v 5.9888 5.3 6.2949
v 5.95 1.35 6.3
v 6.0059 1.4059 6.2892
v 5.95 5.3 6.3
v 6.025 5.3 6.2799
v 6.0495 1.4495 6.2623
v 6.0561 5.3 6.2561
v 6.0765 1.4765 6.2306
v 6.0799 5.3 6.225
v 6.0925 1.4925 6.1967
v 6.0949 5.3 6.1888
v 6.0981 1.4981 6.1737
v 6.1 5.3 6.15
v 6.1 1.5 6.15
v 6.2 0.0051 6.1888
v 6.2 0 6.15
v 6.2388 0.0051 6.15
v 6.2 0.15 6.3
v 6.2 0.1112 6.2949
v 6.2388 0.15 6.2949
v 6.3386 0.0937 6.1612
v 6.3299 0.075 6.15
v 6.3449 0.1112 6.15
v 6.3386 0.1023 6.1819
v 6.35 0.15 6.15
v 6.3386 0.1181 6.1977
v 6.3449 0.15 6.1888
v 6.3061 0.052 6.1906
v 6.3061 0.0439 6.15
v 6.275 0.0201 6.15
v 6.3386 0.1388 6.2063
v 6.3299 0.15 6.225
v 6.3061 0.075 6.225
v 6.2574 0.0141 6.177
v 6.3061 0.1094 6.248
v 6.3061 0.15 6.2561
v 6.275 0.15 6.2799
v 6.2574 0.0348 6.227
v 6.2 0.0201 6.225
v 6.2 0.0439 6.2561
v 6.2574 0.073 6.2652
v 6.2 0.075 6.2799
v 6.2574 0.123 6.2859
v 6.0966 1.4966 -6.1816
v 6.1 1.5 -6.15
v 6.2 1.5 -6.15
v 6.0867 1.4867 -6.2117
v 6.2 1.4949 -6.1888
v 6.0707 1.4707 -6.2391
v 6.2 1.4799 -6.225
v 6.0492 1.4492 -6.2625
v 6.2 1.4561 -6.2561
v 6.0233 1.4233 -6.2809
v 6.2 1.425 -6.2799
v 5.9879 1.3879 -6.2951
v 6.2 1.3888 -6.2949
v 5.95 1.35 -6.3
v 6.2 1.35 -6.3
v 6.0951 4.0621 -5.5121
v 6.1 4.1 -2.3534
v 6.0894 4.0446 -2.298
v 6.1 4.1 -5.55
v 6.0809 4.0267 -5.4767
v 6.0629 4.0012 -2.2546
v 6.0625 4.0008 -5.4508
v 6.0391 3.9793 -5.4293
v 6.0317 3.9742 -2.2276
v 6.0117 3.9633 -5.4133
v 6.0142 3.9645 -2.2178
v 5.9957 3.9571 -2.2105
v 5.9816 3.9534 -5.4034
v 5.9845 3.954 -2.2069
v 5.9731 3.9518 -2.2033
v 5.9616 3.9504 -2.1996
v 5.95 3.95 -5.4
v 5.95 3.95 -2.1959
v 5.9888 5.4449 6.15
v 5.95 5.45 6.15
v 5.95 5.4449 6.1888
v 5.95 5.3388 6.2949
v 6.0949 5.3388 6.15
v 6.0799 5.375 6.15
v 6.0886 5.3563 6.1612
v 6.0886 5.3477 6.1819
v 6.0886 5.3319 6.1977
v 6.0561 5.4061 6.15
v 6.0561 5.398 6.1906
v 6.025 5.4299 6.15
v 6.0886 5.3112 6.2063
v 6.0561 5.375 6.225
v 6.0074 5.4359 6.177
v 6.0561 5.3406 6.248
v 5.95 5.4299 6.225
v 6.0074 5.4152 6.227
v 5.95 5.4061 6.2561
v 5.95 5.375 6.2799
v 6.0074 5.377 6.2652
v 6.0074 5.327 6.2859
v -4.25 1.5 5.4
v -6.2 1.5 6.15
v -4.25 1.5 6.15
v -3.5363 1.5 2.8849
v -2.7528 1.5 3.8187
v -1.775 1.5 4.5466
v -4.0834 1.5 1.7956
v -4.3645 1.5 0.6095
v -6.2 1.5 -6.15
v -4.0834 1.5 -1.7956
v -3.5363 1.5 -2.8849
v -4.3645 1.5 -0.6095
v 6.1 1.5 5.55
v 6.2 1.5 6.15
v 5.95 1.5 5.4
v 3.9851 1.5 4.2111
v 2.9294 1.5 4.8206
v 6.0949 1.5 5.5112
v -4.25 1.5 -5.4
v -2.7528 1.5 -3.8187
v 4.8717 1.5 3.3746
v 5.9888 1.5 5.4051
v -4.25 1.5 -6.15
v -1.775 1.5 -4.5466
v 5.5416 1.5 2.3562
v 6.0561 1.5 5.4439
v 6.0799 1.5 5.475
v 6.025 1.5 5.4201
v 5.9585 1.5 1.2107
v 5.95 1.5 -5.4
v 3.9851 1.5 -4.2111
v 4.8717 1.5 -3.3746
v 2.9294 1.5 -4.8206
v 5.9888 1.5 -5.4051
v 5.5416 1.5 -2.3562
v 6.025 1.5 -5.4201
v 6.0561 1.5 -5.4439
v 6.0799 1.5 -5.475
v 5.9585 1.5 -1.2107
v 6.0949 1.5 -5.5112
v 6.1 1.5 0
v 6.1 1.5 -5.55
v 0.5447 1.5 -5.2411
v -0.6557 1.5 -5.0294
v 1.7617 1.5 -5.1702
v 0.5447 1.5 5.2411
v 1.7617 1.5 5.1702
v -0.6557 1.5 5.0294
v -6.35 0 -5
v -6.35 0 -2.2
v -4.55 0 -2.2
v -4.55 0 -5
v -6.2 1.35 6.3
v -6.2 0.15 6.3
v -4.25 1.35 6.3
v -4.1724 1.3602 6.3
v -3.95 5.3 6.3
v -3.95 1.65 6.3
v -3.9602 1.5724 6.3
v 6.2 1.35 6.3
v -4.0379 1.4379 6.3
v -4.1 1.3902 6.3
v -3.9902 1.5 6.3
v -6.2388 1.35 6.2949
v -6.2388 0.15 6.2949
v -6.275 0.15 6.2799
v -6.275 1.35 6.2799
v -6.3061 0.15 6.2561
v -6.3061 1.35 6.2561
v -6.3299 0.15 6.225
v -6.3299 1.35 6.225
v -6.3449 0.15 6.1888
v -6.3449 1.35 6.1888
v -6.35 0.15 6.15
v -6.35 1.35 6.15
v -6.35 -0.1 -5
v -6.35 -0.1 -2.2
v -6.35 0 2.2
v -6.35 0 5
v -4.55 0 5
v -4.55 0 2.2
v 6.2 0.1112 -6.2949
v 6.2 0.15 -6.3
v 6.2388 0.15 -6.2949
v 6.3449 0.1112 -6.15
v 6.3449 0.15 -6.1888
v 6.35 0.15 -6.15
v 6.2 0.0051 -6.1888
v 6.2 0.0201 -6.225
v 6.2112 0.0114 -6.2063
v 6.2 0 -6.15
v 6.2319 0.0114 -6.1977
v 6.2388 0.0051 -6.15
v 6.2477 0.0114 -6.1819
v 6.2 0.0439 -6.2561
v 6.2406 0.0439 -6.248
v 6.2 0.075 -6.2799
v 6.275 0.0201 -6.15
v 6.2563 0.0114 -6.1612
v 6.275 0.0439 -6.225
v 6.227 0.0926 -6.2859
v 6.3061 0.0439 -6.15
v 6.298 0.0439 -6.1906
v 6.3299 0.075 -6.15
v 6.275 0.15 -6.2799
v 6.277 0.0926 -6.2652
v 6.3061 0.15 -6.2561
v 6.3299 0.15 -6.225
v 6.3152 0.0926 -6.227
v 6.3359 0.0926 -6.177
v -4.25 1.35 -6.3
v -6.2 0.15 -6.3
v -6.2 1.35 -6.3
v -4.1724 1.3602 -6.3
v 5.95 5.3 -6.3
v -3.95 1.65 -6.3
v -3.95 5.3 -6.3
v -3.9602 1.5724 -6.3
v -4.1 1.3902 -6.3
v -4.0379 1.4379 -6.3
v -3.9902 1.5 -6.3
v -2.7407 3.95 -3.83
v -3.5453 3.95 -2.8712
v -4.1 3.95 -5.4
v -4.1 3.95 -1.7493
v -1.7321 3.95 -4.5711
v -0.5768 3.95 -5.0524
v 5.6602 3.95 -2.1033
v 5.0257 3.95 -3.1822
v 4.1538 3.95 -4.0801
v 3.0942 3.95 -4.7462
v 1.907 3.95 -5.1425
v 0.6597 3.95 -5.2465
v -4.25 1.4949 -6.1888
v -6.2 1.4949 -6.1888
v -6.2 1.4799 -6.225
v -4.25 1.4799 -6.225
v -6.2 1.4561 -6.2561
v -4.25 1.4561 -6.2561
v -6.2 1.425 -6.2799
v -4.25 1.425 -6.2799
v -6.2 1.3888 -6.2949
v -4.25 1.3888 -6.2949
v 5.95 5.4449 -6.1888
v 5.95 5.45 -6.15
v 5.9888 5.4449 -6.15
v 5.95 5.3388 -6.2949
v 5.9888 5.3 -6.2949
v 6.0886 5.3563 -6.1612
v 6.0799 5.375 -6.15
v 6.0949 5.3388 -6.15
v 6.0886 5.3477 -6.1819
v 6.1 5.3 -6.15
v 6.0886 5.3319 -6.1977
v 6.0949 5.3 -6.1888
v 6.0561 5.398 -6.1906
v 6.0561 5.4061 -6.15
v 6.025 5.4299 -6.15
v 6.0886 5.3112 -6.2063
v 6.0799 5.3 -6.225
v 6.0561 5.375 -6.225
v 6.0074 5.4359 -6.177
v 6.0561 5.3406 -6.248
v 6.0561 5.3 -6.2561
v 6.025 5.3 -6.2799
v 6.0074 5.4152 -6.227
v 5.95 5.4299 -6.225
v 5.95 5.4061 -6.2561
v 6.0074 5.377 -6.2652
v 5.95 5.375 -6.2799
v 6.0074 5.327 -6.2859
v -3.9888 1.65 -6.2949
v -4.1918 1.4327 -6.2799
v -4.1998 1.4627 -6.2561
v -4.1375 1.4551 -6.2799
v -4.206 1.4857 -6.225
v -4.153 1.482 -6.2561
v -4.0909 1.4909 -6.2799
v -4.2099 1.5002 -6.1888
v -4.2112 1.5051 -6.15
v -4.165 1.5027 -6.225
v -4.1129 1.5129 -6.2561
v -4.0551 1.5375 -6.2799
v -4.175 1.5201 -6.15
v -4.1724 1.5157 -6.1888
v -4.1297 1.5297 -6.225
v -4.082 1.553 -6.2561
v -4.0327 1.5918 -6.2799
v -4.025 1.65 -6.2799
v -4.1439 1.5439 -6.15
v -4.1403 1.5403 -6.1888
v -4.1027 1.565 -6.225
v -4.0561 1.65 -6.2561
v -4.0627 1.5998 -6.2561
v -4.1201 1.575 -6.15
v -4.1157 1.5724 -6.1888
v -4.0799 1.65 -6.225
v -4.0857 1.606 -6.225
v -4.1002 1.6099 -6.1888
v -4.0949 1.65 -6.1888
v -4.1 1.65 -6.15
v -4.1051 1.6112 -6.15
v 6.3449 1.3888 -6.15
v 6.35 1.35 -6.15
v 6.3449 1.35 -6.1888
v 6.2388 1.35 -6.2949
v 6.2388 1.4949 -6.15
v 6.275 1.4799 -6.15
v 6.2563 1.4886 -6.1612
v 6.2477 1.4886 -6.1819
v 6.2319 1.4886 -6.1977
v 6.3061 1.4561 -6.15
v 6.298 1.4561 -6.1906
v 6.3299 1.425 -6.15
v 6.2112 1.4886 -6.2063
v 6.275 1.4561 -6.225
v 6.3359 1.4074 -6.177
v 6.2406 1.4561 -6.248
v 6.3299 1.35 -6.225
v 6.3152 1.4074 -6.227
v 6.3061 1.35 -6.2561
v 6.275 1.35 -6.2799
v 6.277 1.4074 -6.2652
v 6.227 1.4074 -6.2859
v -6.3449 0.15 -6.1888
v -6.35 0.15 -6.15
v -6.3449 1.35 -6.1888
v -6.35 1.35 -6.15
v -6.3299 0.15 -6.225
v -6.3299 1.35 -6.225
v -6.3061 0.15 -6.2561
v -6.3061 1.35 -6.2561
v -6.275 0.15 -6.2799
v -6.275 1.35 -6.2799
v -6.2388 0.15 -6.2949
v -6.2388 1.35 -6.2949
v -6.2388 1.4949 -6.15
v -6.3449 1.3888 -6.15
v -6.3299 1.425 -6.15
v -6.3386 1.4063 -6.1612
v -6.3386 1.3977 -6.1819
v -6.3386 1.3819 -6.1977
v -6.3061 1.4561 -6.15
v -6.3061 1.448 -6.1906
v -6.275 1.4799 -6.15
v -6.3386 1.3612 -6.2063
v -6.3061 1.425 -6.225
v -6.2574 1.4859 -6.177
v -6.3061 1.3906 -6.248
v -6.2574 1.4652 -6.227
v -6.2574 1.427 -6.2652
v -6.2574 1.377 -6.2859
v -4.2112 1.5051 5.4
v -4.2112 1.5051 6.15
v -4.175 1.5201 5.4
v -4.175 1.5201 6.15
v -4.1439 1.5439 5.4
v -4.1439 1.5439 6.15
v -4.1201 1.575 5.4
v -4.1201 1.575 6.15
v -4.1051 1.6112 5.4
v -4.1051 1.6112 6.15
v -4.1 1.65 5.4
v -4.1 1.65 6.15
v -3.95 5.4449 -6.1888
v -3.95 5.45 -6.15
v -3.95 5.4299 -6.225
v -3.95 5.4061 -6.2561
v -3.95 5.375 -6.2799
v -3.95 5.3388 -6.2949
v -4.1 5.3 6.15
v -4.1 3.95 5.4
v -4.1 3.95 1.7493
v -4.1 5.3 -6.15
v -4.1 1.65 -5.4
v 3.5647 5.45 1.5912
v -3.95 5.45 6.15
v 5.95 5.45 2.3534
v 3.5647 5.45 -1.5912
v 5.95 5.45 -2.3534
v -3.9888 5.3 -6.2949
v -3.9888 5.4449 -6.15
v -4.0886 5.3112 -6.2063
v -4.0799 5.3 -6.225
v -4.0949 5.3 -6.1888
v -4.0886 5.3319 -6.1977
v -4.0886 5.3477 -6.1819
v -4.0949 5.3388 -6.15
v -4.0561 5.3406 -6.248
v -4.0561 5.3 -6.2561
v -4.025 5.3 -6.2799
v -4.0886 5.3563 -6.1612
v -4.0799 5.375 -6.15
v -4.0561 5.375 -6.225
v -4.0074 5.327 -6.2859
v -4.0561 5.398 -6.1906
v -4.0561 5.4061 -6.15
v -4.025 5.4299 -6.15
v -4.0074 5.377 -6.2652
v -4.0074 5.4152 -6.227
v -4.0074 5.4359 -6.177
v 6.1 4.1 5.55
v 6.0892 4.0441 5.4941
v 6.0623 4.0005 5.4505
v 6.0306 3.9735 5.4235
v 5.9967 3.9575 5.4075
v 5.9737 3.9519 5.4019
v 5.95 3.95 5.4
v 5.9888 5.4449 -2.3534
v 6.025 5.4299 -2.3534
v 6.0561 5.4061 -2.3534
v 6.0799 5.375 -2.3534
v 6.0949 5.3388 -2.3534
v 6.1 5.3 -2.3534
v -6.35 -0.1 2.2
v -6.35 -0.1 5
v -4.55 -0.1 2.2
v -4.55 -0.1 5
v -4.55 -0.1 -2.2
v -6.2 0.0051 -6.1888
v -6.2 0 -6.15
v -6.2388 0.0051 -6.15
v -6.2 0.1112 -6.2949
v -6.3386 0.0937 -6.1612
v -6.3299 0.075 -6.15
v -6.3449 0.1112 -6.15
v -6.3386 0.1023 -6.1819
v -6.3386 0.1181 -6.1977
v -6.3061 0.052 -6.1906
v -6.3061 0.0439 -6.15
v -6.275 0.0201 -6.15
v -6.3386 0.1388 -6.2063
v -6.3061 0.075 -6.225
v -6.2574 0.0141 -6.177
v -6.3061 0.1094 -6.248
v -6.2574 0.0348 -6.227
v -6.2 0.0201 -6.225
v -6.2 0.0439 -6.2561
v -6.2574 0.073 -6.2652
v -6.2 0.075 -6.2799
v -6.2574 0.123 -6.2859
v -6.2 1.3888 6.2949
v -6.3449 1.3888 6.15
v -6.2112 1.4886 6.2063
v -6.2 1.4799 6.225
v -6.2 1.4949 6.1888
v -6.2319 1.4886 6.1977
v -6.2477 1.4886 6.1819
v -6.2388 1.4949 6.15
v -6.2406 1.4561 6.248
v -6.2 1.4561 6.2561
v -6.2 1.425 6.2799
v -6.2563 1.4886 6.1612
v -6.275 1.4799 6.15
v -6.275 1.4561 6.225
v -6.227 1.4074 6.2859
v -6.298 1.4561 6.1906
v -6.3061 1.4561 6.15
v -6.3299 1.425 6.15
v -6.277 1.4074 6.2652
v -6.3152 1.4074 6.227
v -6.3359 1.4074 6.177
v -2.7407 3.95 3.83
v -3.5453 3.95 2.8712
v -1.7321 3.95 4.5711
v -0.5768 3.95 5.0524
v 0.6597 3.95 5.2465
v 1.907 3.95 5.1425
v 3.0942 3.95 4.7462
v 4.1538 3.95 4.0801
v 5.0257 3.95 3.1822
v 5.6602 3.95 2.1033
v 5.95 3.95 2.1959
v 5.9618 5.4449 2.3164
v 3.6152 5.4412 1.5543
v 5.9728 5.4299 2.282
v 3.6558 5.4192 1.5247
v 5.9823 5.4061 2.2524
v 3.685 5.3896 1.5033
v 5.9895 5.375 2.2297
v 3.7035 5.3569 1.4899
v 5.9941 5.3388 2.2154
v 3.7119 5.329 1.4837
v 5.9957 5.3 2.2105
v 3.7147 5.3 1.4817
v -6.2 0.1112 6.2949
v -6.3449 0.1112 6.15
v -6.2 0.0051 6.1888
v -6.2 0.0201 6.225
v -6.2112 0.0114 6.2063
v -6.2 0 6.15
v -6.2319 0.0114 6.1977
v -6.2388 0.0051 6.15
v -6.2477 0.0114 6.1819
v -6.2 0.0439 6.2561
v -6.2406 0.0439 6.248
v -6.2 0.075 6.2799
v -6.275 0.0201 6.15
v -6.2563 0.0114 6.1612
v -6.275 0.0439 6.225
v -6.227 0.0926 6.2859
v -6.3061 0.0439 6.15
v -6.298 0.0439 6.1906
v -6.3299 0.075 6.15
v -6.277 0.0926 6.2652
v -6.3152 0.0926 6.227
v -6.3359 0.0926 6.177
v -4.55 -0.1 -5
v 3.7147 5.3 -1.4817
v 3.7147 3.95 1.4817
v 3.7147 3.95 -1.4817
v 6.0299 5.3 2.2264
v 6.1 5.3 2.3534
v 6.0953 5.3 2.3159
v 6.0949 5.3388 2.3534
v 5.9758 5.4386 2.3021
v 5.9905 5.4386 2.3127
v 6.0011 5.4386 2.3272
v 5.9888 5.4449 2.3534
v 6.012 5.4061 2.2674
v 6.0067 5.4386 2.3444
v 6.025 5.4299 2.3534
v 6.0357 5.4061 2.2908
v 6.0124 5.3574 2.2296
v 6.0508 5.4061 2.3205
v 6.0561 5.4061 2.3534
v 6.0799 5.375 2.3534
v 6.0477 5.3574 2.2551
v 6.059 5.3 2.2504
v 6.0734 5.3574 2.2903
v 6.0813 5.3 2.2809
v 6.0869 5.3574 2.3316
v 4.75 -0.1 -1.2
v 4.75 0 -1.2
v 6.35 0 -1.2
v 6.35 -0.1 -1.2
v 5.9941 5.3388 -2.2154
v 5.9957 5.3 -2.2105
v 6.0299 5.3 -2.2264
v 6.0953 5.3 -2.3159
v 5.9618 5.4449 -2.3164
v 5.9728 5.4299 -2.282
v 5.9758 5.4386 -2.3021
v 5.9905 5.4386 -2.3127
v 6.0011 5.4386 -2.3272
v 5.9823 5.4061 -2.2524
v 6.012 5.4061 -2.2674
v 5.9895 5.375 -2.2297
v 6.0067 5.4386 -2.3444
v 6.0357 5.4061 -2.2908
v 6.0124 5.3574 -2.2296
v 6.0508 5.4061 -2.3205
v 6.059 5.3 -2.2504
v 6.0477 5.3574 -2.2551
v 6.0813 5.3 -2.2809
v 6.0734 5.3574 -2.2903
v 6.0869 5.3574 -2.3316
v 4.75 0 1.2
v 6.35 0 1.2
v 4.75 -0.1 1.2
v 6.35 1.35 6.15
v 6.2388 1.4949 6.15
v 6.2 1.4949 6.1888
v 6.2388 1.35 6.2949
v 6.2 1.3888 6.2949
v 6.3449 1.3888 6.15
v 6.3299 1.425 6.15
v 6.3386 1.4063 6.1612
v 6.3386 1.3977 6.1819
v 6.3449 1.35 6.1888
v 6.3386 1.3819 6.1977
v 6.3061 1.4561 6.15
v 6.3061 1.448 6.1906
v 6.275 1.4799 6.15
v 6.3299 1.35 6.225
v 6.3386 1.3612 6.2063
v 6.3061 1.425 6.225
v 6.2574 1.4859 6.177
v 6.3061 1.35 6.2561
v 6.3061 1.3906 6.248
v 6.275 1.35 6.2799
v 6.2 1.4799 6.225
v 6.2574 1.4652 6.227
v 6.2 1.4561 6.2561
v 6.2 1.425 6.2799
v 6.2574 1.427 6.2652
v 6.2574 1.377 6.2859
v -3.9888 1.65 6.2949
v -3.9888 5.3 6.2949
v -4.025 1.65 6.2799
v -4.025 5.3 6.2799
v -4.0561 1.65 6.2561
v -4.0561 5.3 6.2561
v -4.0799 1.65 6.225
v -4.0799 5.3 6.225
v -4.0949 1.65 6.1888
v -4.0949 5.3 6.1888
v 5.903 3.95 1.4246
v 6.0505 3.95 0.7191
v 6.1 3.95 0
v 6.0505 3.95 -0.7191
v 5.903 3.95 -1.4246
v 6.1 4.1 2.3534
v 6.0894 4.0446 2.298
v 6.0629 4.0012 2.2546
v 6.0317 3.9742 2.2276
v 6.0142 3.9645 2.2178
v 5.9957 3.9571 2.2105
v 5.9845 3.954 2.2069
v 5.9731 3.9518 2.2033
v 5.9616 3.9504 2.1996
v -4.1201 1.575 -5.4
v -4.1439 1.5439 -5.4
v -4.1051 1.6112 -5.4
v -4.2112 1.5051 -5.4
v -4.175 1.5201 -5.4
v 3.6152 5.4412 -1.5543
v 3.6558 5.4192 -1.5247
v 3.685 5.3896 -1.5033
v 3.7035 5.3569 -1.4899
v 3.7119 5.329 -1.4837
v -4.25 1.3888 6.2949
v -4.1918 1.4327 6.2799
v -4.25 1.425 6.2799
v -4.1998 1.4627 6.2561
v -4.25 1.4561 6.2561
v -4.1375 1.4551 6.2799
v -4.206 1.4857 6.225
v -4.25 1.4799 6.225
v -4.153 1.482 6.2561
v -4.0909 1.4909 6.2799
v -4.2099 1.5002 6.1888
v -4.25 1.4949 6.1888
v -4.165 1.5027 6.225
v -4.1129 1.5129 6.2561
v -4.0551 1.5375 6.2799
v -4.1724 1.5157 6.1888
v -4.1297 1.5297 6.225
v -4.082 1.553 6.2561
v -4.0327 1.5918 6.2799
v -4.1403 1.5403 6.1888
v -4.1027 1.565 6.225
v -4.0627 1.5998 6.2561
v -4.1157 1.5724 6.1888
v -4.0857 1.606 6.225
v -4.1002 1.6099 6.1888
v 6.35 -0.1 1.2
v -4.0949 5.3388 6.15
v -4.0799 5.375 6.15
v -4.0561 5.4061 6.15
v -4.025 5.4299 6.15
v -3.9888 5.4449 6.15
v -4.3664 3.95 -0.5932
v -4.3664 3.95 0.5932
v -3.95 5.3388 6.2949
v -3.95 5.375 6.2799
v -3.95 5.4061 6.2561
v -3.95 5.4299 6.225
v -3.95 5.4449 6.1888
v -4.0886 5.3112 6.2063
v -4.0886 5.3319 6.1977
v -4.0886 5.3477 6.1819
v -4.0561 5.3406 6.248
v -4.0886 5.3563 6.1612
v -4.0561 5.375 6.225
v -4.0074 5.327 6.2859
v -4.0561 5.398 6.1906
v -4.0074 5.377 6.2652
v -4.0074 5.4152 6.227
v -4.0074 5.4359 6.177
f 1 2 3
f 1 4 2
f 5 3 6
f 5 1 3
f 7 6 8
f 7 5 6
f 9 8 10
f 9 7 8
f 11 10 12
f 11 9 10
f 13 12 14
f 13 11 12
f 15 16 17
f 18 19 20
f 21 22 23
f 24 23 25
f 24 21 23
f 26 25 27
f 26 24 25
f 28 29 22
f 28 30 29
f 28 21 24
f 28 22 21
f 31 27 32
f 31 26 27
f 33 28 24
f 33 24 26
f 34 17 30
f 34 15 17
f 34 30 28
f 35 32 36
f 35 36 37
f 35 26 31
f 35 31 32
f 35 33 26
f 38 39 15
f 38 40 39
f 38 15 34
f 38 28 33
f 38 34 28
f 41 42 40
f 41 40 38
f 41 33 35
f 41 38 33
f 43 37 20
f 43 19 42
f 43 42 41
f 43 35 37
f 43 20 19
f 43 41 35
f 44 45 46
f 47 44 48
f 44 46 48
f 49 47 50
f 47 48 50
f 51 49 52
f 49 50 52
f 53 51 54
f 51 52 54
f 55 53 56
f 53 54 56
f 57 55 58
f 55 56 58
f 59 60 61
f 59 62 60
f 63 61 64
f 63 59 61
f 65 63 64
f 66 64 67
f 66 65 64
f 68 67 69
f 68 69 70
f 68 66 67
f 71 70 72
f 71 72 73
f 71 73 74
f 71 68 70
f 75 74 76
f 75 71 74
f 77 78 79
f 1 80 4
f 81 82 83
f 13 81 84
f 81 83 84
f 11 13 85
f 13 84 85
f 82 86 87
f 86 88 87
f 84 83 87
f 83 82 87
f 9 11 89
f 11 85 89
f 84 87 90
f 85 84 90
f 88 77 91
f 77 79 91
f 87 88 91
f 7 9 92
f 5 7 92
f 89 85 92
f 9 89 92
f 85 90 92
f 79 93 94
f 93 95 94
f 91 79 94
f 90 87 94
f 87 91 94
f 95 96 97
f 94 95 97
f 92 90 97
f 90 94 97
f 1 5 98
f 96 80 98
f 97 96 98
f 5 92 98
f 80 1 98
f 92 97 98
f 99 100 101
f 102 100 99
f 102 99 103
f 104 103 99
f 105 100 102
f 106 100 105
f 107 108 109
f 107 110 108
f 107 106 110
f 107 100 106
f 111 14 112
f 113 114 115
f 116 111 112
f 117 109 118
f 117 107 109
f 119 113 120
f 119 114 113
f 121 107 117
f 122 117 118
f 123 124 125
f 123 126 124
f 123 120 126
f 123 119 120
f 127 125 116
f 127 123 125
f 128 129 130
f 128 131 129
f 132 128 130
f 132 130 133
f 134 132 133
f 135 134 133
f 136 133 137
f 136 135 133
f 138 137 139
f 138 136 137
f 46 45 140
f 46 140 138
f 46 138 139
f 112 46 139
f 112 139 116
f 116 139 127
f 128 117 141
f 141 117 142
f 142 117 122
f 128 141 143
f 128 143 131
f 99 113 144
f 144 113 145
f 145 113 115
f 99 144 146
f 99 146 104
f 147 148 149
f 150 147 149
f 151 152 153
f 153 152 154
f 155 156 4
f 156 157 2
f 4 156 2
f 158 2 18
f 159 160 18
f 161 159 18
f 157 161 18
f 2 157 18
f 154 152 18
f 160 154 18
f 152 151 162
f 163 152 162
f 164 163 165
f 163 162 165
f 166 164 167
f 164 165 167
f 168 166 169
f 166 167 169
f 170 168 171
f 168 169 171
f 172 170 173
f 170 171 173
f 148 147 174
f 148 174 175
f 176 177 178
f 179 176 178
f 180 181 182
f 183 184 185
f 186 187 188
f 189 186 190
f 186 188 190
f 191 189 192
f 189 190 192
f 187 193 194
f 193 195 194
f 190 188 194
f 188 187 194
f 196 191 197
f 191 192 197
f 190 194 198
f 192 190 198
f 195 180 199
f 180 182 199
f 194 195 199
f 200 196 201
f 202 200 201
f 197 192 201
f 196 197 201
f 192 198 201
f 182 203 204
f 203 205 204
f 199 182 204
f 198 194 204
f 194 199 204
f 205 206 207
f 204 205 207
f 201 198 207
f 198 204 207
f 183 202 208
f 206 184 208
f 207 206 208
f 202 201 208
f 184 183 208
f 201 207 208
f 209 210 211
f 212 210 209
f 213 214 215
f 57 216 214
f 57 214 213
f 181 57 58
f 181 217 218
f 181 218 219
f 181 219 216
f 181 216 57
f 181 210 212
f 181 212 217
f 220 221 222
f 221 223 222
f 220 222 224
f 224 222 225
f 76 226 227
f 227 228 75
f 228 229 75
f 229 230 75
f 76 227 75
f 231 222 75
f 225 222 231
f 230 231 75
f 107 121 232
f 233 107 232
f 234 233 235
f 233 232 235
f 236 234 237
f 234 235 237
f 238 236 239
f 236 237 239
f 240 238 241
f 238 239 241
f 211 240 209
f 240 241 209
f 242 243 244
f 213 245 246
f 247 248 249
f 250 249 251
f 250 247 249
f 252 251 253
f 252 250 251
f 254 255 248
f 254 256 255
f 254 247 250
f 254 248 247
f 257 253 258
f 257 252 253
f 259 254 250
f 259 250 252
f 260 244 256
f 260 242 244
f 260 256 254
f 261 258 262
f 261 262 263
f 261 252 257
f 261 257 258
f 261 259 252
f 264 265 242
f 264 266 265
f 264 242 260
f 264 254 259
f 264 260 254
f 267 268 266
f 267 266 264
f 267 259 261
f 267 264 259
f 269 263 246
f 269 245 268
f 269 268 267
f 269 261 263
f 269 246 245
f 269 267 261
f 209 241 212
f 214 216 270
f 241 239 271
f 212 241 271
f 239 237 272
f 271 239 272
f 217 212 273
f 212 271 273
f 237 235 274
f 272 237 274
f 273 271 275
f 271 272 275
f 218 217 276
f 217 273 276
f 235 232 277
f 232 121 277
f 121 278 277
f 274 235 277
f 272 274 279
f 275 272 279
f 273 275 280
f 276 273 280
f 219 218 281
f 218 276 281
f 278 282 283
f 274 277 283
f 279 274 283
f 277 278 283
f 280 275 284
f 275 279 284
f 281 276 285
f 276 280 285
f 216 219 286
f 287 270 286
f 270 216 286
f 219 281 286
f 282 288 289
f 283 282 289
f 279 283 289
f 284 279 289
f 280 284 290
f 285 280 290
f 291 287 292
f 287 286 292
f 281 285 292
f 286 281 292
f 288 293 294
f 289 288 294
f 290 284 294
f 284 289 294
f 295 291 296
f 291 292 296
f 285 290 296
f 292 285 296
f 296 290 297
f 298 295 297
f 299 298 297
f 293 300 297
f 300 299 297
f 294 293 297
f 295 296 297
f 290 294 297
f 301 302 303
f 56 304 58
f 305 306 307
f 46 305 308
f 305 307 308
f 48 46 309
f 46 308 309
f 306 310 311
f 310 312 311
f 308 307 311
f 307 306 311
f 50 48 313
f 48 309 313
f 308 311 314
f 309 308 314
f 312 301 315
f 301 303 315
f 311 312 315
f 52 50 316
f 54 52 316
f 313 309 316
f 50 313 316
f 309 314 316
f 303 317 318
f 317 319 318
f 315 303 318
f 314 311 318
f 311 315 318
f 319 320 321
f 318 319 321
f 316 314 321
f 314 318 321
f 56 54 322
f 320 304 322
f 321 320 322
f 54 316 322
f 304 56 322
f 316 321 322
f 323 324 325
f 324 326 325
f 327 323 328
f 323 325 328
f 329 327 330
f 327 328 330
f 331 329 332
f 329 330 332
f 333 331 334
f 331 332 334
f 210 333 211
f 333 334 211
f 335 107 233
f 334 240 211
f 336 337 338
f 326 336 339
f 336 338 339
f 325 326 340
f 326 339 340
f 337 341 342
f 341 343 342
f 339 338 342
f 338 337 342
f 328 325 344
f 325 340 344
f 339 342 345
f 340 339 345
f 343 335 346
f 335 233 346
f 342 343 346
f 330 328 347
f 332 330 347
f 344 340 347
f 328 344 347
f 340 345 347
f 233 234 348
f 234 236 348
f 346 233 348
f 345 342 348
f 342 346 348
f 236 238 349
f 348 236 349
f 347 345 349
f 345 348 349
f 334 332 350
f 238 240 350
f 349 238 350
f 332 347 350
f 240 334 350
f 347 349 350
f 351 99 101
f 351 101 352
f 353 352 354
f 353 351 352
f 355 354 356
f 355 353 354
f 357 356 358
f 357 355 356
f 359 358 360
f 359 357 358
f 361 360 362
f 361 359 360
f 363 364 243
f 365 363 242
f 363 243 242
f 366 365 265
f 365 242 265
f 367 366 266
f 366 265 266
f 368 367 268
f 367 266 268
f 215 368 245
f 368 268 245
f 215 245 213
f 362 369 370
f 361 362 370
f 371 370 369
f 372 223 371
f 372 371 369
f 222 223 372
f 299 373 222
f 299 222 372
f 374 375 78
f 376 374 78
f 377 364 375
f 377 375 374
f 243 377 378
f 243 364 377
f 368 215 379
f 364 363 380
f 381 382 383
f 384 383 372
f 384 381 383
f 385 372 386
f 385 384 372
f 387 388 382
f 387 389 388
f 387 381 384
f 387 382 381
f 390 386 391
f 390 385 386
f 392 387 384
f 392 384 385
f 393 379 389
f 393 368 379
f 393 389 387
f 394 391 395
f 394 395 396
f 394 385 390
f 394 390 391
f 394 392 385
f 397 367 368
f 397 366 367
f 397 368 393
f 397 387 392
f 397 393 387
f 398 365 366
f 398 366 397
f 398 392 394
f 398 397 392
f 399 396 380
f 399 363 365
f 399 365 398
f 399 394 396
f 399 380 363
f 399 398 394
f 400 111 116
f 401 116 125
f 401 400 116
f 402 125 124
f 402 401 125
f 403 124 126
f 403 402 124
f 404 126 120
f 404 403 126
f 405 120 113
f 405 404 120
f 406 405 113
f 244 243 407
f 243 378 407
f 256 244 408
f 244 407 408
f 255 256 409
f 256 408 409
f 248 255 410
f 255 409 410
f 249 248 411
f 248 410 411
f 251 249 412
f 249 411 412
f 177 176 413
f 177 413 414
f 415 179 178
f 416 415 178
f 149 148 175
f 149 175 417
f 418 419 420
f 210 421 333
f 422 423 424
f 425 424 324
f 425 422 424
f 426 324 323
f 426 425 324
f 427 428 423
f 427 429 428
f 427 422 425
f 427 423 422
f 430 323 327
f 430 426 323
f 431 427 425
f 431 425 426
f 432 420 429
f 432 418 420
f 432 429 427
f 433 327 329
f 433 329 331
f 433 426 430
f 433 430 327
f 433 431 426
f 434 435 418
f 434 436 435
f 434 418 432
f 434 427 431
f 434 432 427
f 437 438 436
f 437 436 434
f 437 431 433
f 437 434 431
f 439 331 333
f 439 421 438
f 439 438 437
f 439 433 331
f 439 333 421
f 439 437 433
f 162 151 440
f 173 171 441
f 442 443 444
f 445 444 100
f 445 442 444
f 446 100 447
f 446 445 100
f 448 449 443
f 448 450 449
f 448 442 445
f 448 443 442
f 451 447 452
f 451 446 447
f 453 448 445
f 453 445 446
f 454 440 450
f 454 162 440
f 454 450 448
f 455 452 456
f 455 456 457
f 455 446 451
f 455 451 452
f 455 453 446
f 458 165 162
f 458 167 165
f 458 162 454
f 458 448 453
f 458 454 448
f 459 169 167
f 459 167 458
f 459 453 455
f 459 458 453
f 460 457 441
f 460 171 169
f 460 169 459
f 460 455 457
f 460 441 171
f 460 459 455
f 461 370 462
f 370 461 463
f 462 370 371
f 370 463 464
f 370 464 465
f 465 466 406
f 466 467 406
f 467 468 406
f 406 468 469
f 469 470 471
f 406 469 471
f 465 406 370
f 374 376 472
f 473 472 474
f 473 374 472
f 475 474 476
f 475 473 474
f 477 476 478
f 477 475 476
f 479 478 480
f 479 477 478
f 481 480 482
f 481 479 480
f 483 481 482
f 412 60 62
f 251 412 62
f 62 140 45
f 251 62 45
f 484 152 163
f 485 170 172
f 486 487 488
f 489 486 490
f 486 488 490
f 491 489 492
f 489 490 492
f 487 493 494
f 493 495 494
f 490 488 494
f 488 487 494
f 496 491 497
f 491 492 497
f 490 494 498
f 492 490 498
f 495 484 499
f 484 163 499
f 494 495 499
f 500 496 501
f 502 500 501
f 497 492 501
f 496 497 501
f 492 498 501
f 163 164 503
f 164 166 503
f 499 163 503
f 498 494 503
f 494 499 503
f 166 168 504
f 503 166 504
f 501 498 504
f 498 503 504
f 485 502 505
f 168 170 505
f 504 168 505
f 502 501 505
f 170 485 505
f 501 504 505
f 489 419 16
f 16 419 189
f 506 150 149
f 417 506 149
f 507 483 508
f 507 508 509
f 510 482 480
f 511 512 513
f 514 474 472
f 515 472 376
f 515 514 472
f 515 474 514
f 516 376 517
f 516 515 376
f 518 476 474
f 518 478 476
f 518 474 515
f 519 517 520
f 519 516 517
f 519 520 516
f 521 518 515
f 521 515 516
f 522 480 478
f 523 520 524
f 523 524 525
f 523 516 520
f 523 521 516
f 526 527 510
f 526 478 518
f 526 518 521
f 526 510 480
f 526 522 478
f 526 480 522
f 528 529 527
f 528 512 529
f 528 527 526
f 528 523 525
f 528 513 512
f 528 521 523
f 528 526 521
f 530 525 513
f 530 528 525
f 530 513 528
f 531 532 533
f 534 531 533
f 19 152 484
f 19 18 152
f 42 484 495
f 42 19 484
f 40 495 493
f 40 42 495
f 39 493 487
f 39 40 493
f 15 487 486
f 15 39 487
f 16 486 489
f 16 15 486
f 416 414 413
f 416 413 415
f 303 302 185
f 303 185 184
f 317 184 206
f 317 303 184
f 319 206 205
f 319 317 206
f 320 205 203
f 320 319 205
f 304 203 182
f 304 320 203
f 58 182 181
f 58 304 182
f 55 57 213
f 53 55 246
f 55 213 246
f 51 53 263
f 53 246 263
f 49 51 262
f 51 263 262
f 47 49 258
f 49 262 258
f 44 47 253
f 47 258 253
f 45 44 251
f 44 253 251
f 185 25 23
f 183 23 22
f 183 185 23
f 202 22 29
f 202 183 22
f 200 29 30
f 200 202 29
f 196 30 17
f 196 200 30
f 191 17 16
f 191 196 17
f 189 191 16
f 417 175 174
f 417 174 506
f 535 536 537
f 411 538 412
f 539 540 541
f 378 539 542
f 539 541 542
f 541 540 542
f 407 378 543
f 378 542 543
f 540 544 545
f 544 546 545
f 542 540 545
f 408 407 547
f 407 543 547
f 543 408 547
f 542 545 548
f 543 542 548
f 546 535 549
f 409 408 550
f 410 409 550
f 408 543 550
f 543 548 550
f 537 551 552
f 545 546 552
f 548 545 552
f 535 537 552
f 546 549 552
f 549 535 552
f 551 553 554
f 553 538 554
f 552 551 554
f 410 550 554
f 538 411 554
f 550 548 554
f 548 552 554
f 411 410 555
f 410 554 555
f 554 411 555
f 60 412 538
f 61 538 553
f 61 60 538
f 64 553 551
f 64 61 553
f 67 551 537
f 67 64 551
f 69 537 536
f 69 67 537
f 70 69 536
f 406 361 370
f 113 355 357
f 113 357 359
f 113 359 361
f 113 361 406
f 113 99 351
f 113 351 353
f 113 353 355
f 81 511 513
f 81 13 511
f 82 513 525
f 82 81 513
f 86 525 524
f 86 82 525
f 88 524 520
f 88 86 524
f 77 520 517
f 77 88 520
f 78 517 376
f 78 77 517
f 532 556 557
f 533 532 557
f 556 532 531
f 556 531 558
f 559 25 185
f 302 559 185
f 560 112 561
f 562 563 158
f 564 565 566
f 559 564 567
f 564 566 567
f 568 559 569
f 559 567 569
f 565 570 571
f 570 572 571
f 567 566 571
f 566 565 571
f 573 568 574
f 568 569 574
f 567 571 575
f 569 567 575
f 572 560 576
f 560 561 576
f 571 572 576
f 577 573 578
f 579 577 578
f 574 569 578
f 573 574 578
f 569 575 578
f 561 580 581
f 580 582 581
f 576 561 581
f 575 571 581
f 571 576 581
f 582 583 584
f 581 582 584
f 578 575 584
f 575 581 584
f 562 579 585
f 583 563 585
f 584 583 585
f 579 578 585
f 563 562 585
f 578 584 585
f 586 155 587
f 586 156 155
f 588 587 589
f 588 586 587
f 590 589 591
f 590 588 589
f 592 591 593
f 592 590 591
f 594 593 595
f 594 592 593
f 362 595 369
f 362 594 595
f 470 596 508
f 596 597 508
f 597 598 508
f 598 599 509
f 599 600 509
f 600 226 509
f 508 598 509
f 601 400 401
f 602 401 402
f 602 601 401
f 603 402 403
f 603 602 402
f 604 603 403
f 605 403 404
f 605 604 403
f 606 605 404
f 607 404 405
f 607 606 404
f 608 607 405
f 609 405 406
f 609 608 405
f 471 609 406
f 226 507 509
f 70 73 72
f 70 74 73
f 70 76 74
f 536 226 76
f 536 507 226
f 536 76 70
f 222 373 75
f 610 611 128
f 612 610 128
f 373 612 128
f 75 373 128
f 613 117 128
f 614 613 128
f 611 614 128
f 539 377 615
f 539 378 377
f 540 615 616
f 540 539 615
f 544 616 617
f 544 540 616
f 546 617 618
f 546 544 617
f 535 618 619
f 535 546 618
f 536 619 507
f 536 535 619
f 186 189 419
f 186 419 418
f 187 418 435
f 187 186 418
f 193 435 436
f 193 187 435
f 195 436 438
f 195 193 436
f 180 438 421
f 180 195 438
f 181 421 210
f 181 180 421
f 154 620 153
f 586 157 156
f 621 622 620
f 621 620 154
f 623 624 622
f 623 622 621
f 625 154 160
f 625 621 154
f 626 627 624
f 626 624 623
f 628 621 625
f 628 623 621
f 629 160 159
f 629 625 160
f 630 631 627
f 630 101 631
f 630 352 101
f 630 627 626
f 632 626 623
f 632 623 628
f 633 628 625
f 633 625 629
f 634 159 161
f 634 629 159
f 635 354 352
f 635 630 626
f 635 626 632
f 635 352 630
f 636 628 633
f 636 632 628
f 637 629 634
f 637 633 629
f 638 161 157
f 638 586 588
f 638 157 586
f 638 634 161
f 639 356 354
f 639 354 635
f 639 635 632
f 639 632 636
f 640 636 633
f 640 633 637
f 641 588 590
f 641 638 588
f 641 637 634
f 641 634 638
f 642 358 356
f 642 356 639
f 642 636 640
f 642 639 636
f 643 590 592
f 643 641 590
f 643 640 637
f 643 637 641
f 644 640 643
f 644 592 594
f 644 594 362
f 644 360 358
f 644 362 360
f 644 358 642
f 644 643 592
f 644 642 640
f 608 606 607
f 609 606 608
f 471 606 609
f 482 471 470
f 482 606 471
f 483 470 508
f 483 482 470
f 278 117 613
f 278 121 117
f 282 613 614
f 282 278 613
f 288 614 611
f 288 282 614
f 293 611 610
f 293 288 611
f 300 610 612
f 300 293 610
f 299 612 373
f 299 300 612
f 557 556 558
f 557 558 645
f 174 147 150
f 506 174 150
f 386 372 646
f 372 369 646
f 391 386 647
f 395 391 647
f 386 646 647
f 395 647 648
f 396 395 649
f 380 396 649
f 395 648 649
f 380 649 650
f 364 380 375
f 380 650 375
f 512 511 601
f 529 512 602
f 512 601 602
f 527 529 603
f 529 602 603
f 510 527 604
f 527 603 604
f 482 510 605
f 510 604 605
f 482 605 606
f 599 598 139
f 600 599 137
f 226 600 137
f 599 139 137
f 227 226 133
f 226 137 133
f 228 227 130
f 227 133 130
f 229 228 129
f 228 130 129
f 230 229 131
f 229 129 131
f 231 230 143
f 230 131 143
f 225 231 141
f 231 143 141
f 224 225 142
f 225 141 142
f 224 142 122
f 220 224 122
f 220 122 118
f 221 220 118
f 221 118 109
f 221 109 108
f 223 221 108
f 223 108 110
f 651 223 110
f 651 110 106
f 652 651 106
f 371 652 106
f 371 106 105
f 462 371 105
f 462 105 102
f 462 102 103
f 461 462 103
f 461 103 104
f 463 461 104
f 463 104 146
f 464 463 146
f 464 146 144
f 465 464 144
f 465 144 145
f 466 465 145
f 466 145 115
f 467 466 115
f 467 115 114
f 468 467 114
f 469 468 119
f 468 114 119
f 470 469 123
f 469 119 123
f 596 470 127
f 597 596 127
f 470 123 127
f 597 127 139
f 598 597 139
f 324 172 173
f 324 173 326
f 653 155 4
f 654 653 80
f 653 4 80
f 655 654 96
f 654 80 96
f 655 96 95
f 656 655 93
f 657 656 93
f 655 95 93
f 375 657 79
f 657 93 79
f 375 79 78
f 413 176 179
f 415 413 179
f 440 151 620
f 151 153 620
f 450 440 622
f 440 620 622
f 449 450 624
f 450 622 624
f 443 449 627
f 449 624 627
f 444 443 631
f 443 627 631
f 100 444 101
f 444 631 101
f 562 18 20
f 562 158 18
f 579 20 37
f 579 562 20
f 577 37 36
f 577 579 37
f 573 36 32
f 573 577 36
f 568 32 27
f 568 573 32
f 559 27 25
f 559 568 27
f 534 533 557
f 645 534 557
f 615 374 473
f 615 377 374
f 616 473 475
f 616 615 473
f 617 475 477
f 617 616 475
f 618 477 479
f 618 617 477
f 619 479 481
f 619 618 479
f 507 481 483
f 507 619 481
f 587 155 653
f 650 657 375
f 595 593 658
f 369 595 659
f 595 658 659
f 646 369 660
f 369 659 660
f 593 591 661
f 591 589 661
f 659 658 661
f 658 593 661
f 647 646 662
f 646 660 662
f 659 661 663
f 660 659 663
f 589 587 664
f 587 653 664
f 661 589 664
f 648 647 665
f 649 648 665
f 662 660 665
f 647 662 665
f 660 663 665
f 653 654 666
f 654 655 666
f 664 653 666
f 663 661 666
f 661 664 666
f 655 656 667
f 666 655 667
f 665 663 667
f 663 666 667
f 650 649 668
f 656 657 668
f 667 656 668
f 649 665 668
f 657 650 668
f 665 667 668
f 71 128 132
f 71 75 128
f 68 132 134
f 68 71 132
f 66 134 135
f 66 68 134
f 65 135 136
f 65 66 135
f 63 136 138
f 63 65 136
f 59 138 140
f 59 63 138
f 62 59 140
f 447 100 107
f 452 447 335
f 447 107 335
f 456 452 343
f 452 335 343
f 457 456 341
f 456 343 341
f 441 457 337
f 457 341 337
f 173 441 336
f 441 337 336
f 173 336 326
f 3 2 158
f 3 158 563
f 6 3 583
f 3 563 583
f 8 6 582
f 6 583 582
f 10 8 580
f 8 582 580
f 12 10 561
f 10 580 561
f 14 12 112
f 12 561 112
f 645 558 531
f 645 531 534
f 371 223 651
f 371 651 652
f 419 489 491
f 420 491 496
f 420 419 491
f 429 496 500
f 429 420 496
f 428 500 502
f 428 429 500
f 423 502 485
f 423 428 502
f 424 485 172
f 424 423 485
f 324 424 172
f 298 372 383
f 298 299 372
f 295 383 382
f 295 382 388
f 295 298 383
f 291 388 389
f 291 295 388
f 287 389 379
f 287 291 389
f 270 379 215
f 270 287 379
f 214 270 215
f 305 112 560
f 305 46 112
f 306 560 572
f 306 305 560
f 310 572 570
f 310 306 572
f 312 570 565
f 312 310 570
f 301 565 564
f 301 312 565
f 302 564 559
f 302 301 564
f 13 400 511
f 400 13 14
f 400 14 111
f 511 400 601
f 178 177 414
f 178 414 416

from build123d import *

# Parameters (mm, degrees)
SKETCH1_W             = 12.7
SKETCH1_H             = 12.6
BOSS_EXTRUDE1_DEPTH   = 1.5
SKETCH2_R             = 5.25
BOSS_EXTRUDE2_DEPTH   = 2.45
SKETCH3_W             = 10.2
SKETCH3_H             = 0.9
BOSS_EXTRUDE3_DEPTH   = 3.95
SKETCH4_W             = 10.2
SKETCH4_H             = 12.6
BOSS_EXTRUDE4_DEPTH   = 1.5
CUT_EXTRUDE1_DEPTH    = 1.5
SKETCH6_W             = 1.8
SKETCH6_H             = 2.8
BOSS_EXTRUDE5_DEPTH   = 0.1
BOSS_EXTRUDE5_2_DEPTH = 0.1
SKETCH6_W_2           = 1.6
SKETCH6_H_2           = 2.4
BOSS_EXTRUDE5_3_DEPTH = 0.1
FILLET1_R             = 0.15


with BuildPart() as part:
    # Sketch1 → Boss-Extrude1 (new body)
    with BuildSketch(Plane(origin=(0, 0, 0), x_dir=(1, 0, 0), z_dir=(0, 1, 0))):
        Rectangle(SKETCH1_W, SKETCH1_H)
    extrude(amount=BOSS_EXTRUDE1_DEPTH)

    # Sketch3 → Boss-Extrude3 (add)
    with BuildSketch(Plane(origin=(0, 1.5, 0), x_dir=(1, 0, 0), z_dir=(0, 1, 0))):
        with Locations((1, 5.85)):
            Rectangle(SKETCH3_W, SKETCH3_H)
        with Locations((1, -5.85)):
            Rectangle(SKETCH3_W, SKETCH3_H)
    extrude(amount=BOSS_EXTRUDE3_DEPTH)



with BuildPart() as body_2:
    # Sketch2 → Boss-Extrude2 (new body)
    with BuildSketch(Plane(origin=(0, 1.5, 0), x_dir=(1, 0, 0), z_dir=(0, 1, 0))):
        with Locations((0.85, 0)):
            Circle(SKETCH2_R)
    extrude(amount=BOSS_EXTRUDE2_DEPTH)


with BuildPart() as part_1:
    add(part.part)

    add(body_2.part)  # Boss-Extrude4 merges body 2
    # Sketch4 → Boss-Extrude4 (add)
    with BuildSketch(Plane(origin=(0, 5.45, 0), x_dir=(1, 0, 0), z_dir=(0, 1, 0))):
        with Locations((1, 0)):
            Rectangle(SKETCH4_W, SKETCH4_H)
    extrude(amount=-BOSS_EXTRUDE4_DEPTH)

    # Sketch5 → Cut-Extrude1 (cut)
    with BuildSketch(Plane(origin=(0, 5.45, 0), x_dir=(1, 0, 0), z_dir=(0, 1, 0))):
        Polygon((3.714686841, -1.48166104), (3.714686841, 1.48166104), (6.1, 2.243851), (6.1, -2.243851), align=None)
    extrude(amount=-CUT_EXTRUDE1_DEPTH, mode=Mode.SUBTRACT)

    # Fillet1
    fillet1_edges = [part_1.edges().sort_by_distance(p)[0] for p in [
        (1, 5.45, 6.3),
        (6.1, 5.45, 4.2719255),
        (1, 5.45, -6.3),
        (6.1, 3.95, 3.8219255),
        (-6.35, 0.75, 6.3),
        (0, 0, 6.3),
        (6.35, 0.75, -6.3),
        (0, 0, -6.3),
        (-4.1, 1.5, -5.85),
        (6.1, 2.725, -5.4),
        (-4.1, 1.5, 5.85),
        (6.1, 2.725, 5.4),
        (-5.225, 1.5, 6.3),
        (6.225, 1.5, 6.3),
        (6.35, 1.5, 0),
        (6.225, 1.5, -6.3),
        (-5.225, 1.5, -6.3),
        (-6.35, 1.5, 0),
        (-6.35, 0, 0),
        (-6.35, 0.75, -6.3),
        (6.35, 0, 0),
        (6.35, 0.75, 6.3),
        (6.1, 5.45, -4.2719255),
        (6.1, 3.95, -3.8219255),
        (6.1, 4.7, -2.243851),
        (6.1, 4.7, 2.243851),
        (4.90734342, 5.45, -1.86275602),
        (3.714686841, 5.45, 0),
        (4.90734342, 5.45, 1.86275602),
        (-4.1, 3.475, 6.3),
        (-4.1, 3.475, -6.3),
        (6.1, 3.475, -6.3),
        (6.1, 3.475, 6.3),
        (-4.1, 5.45, 0),
    ]]
    fillet(fillet1_edges, radius=FILLET1_R)


with BuildPart() as body_2_2:
    # Sketch6 → Boss-Extrude5 (new body)
    with BuildSketch(Plane.XZ):
        with Locations((-5.45, -3.6)):
            Rectangle(SKETCH6_W, SKETCH6_H)
    extrude(amount=BOSS_EXTRUDE5_DEPTH)


with BuildPart() as body_3:
    # Sketch6 → Boss-Extrude5 2 (new body)
    with BuildSketch(Plane.XZ):
        with Locations((-5.45, 3.6)):
            Rectangle(SKETCH6_W, SKETCH6_H)
    extrude(amount=BOSS_EXTRUDE5_2_DEPTH)


with BuildPart() as body_4:
    # Sketch6 → Boss-Extrude5 3 (new body)
    with BuildSketch(Plane.XZ):
        with Locations((5.55, 0)):
            Rectangle(SKETCH6_W_2, SKETCH6_H_2)
    extrude(amount=BOSS_EXTRUDE5_3_DEPTH)


solid = Compound([part_1.part, body_2_2.part, body_3.part, body_4.part])
